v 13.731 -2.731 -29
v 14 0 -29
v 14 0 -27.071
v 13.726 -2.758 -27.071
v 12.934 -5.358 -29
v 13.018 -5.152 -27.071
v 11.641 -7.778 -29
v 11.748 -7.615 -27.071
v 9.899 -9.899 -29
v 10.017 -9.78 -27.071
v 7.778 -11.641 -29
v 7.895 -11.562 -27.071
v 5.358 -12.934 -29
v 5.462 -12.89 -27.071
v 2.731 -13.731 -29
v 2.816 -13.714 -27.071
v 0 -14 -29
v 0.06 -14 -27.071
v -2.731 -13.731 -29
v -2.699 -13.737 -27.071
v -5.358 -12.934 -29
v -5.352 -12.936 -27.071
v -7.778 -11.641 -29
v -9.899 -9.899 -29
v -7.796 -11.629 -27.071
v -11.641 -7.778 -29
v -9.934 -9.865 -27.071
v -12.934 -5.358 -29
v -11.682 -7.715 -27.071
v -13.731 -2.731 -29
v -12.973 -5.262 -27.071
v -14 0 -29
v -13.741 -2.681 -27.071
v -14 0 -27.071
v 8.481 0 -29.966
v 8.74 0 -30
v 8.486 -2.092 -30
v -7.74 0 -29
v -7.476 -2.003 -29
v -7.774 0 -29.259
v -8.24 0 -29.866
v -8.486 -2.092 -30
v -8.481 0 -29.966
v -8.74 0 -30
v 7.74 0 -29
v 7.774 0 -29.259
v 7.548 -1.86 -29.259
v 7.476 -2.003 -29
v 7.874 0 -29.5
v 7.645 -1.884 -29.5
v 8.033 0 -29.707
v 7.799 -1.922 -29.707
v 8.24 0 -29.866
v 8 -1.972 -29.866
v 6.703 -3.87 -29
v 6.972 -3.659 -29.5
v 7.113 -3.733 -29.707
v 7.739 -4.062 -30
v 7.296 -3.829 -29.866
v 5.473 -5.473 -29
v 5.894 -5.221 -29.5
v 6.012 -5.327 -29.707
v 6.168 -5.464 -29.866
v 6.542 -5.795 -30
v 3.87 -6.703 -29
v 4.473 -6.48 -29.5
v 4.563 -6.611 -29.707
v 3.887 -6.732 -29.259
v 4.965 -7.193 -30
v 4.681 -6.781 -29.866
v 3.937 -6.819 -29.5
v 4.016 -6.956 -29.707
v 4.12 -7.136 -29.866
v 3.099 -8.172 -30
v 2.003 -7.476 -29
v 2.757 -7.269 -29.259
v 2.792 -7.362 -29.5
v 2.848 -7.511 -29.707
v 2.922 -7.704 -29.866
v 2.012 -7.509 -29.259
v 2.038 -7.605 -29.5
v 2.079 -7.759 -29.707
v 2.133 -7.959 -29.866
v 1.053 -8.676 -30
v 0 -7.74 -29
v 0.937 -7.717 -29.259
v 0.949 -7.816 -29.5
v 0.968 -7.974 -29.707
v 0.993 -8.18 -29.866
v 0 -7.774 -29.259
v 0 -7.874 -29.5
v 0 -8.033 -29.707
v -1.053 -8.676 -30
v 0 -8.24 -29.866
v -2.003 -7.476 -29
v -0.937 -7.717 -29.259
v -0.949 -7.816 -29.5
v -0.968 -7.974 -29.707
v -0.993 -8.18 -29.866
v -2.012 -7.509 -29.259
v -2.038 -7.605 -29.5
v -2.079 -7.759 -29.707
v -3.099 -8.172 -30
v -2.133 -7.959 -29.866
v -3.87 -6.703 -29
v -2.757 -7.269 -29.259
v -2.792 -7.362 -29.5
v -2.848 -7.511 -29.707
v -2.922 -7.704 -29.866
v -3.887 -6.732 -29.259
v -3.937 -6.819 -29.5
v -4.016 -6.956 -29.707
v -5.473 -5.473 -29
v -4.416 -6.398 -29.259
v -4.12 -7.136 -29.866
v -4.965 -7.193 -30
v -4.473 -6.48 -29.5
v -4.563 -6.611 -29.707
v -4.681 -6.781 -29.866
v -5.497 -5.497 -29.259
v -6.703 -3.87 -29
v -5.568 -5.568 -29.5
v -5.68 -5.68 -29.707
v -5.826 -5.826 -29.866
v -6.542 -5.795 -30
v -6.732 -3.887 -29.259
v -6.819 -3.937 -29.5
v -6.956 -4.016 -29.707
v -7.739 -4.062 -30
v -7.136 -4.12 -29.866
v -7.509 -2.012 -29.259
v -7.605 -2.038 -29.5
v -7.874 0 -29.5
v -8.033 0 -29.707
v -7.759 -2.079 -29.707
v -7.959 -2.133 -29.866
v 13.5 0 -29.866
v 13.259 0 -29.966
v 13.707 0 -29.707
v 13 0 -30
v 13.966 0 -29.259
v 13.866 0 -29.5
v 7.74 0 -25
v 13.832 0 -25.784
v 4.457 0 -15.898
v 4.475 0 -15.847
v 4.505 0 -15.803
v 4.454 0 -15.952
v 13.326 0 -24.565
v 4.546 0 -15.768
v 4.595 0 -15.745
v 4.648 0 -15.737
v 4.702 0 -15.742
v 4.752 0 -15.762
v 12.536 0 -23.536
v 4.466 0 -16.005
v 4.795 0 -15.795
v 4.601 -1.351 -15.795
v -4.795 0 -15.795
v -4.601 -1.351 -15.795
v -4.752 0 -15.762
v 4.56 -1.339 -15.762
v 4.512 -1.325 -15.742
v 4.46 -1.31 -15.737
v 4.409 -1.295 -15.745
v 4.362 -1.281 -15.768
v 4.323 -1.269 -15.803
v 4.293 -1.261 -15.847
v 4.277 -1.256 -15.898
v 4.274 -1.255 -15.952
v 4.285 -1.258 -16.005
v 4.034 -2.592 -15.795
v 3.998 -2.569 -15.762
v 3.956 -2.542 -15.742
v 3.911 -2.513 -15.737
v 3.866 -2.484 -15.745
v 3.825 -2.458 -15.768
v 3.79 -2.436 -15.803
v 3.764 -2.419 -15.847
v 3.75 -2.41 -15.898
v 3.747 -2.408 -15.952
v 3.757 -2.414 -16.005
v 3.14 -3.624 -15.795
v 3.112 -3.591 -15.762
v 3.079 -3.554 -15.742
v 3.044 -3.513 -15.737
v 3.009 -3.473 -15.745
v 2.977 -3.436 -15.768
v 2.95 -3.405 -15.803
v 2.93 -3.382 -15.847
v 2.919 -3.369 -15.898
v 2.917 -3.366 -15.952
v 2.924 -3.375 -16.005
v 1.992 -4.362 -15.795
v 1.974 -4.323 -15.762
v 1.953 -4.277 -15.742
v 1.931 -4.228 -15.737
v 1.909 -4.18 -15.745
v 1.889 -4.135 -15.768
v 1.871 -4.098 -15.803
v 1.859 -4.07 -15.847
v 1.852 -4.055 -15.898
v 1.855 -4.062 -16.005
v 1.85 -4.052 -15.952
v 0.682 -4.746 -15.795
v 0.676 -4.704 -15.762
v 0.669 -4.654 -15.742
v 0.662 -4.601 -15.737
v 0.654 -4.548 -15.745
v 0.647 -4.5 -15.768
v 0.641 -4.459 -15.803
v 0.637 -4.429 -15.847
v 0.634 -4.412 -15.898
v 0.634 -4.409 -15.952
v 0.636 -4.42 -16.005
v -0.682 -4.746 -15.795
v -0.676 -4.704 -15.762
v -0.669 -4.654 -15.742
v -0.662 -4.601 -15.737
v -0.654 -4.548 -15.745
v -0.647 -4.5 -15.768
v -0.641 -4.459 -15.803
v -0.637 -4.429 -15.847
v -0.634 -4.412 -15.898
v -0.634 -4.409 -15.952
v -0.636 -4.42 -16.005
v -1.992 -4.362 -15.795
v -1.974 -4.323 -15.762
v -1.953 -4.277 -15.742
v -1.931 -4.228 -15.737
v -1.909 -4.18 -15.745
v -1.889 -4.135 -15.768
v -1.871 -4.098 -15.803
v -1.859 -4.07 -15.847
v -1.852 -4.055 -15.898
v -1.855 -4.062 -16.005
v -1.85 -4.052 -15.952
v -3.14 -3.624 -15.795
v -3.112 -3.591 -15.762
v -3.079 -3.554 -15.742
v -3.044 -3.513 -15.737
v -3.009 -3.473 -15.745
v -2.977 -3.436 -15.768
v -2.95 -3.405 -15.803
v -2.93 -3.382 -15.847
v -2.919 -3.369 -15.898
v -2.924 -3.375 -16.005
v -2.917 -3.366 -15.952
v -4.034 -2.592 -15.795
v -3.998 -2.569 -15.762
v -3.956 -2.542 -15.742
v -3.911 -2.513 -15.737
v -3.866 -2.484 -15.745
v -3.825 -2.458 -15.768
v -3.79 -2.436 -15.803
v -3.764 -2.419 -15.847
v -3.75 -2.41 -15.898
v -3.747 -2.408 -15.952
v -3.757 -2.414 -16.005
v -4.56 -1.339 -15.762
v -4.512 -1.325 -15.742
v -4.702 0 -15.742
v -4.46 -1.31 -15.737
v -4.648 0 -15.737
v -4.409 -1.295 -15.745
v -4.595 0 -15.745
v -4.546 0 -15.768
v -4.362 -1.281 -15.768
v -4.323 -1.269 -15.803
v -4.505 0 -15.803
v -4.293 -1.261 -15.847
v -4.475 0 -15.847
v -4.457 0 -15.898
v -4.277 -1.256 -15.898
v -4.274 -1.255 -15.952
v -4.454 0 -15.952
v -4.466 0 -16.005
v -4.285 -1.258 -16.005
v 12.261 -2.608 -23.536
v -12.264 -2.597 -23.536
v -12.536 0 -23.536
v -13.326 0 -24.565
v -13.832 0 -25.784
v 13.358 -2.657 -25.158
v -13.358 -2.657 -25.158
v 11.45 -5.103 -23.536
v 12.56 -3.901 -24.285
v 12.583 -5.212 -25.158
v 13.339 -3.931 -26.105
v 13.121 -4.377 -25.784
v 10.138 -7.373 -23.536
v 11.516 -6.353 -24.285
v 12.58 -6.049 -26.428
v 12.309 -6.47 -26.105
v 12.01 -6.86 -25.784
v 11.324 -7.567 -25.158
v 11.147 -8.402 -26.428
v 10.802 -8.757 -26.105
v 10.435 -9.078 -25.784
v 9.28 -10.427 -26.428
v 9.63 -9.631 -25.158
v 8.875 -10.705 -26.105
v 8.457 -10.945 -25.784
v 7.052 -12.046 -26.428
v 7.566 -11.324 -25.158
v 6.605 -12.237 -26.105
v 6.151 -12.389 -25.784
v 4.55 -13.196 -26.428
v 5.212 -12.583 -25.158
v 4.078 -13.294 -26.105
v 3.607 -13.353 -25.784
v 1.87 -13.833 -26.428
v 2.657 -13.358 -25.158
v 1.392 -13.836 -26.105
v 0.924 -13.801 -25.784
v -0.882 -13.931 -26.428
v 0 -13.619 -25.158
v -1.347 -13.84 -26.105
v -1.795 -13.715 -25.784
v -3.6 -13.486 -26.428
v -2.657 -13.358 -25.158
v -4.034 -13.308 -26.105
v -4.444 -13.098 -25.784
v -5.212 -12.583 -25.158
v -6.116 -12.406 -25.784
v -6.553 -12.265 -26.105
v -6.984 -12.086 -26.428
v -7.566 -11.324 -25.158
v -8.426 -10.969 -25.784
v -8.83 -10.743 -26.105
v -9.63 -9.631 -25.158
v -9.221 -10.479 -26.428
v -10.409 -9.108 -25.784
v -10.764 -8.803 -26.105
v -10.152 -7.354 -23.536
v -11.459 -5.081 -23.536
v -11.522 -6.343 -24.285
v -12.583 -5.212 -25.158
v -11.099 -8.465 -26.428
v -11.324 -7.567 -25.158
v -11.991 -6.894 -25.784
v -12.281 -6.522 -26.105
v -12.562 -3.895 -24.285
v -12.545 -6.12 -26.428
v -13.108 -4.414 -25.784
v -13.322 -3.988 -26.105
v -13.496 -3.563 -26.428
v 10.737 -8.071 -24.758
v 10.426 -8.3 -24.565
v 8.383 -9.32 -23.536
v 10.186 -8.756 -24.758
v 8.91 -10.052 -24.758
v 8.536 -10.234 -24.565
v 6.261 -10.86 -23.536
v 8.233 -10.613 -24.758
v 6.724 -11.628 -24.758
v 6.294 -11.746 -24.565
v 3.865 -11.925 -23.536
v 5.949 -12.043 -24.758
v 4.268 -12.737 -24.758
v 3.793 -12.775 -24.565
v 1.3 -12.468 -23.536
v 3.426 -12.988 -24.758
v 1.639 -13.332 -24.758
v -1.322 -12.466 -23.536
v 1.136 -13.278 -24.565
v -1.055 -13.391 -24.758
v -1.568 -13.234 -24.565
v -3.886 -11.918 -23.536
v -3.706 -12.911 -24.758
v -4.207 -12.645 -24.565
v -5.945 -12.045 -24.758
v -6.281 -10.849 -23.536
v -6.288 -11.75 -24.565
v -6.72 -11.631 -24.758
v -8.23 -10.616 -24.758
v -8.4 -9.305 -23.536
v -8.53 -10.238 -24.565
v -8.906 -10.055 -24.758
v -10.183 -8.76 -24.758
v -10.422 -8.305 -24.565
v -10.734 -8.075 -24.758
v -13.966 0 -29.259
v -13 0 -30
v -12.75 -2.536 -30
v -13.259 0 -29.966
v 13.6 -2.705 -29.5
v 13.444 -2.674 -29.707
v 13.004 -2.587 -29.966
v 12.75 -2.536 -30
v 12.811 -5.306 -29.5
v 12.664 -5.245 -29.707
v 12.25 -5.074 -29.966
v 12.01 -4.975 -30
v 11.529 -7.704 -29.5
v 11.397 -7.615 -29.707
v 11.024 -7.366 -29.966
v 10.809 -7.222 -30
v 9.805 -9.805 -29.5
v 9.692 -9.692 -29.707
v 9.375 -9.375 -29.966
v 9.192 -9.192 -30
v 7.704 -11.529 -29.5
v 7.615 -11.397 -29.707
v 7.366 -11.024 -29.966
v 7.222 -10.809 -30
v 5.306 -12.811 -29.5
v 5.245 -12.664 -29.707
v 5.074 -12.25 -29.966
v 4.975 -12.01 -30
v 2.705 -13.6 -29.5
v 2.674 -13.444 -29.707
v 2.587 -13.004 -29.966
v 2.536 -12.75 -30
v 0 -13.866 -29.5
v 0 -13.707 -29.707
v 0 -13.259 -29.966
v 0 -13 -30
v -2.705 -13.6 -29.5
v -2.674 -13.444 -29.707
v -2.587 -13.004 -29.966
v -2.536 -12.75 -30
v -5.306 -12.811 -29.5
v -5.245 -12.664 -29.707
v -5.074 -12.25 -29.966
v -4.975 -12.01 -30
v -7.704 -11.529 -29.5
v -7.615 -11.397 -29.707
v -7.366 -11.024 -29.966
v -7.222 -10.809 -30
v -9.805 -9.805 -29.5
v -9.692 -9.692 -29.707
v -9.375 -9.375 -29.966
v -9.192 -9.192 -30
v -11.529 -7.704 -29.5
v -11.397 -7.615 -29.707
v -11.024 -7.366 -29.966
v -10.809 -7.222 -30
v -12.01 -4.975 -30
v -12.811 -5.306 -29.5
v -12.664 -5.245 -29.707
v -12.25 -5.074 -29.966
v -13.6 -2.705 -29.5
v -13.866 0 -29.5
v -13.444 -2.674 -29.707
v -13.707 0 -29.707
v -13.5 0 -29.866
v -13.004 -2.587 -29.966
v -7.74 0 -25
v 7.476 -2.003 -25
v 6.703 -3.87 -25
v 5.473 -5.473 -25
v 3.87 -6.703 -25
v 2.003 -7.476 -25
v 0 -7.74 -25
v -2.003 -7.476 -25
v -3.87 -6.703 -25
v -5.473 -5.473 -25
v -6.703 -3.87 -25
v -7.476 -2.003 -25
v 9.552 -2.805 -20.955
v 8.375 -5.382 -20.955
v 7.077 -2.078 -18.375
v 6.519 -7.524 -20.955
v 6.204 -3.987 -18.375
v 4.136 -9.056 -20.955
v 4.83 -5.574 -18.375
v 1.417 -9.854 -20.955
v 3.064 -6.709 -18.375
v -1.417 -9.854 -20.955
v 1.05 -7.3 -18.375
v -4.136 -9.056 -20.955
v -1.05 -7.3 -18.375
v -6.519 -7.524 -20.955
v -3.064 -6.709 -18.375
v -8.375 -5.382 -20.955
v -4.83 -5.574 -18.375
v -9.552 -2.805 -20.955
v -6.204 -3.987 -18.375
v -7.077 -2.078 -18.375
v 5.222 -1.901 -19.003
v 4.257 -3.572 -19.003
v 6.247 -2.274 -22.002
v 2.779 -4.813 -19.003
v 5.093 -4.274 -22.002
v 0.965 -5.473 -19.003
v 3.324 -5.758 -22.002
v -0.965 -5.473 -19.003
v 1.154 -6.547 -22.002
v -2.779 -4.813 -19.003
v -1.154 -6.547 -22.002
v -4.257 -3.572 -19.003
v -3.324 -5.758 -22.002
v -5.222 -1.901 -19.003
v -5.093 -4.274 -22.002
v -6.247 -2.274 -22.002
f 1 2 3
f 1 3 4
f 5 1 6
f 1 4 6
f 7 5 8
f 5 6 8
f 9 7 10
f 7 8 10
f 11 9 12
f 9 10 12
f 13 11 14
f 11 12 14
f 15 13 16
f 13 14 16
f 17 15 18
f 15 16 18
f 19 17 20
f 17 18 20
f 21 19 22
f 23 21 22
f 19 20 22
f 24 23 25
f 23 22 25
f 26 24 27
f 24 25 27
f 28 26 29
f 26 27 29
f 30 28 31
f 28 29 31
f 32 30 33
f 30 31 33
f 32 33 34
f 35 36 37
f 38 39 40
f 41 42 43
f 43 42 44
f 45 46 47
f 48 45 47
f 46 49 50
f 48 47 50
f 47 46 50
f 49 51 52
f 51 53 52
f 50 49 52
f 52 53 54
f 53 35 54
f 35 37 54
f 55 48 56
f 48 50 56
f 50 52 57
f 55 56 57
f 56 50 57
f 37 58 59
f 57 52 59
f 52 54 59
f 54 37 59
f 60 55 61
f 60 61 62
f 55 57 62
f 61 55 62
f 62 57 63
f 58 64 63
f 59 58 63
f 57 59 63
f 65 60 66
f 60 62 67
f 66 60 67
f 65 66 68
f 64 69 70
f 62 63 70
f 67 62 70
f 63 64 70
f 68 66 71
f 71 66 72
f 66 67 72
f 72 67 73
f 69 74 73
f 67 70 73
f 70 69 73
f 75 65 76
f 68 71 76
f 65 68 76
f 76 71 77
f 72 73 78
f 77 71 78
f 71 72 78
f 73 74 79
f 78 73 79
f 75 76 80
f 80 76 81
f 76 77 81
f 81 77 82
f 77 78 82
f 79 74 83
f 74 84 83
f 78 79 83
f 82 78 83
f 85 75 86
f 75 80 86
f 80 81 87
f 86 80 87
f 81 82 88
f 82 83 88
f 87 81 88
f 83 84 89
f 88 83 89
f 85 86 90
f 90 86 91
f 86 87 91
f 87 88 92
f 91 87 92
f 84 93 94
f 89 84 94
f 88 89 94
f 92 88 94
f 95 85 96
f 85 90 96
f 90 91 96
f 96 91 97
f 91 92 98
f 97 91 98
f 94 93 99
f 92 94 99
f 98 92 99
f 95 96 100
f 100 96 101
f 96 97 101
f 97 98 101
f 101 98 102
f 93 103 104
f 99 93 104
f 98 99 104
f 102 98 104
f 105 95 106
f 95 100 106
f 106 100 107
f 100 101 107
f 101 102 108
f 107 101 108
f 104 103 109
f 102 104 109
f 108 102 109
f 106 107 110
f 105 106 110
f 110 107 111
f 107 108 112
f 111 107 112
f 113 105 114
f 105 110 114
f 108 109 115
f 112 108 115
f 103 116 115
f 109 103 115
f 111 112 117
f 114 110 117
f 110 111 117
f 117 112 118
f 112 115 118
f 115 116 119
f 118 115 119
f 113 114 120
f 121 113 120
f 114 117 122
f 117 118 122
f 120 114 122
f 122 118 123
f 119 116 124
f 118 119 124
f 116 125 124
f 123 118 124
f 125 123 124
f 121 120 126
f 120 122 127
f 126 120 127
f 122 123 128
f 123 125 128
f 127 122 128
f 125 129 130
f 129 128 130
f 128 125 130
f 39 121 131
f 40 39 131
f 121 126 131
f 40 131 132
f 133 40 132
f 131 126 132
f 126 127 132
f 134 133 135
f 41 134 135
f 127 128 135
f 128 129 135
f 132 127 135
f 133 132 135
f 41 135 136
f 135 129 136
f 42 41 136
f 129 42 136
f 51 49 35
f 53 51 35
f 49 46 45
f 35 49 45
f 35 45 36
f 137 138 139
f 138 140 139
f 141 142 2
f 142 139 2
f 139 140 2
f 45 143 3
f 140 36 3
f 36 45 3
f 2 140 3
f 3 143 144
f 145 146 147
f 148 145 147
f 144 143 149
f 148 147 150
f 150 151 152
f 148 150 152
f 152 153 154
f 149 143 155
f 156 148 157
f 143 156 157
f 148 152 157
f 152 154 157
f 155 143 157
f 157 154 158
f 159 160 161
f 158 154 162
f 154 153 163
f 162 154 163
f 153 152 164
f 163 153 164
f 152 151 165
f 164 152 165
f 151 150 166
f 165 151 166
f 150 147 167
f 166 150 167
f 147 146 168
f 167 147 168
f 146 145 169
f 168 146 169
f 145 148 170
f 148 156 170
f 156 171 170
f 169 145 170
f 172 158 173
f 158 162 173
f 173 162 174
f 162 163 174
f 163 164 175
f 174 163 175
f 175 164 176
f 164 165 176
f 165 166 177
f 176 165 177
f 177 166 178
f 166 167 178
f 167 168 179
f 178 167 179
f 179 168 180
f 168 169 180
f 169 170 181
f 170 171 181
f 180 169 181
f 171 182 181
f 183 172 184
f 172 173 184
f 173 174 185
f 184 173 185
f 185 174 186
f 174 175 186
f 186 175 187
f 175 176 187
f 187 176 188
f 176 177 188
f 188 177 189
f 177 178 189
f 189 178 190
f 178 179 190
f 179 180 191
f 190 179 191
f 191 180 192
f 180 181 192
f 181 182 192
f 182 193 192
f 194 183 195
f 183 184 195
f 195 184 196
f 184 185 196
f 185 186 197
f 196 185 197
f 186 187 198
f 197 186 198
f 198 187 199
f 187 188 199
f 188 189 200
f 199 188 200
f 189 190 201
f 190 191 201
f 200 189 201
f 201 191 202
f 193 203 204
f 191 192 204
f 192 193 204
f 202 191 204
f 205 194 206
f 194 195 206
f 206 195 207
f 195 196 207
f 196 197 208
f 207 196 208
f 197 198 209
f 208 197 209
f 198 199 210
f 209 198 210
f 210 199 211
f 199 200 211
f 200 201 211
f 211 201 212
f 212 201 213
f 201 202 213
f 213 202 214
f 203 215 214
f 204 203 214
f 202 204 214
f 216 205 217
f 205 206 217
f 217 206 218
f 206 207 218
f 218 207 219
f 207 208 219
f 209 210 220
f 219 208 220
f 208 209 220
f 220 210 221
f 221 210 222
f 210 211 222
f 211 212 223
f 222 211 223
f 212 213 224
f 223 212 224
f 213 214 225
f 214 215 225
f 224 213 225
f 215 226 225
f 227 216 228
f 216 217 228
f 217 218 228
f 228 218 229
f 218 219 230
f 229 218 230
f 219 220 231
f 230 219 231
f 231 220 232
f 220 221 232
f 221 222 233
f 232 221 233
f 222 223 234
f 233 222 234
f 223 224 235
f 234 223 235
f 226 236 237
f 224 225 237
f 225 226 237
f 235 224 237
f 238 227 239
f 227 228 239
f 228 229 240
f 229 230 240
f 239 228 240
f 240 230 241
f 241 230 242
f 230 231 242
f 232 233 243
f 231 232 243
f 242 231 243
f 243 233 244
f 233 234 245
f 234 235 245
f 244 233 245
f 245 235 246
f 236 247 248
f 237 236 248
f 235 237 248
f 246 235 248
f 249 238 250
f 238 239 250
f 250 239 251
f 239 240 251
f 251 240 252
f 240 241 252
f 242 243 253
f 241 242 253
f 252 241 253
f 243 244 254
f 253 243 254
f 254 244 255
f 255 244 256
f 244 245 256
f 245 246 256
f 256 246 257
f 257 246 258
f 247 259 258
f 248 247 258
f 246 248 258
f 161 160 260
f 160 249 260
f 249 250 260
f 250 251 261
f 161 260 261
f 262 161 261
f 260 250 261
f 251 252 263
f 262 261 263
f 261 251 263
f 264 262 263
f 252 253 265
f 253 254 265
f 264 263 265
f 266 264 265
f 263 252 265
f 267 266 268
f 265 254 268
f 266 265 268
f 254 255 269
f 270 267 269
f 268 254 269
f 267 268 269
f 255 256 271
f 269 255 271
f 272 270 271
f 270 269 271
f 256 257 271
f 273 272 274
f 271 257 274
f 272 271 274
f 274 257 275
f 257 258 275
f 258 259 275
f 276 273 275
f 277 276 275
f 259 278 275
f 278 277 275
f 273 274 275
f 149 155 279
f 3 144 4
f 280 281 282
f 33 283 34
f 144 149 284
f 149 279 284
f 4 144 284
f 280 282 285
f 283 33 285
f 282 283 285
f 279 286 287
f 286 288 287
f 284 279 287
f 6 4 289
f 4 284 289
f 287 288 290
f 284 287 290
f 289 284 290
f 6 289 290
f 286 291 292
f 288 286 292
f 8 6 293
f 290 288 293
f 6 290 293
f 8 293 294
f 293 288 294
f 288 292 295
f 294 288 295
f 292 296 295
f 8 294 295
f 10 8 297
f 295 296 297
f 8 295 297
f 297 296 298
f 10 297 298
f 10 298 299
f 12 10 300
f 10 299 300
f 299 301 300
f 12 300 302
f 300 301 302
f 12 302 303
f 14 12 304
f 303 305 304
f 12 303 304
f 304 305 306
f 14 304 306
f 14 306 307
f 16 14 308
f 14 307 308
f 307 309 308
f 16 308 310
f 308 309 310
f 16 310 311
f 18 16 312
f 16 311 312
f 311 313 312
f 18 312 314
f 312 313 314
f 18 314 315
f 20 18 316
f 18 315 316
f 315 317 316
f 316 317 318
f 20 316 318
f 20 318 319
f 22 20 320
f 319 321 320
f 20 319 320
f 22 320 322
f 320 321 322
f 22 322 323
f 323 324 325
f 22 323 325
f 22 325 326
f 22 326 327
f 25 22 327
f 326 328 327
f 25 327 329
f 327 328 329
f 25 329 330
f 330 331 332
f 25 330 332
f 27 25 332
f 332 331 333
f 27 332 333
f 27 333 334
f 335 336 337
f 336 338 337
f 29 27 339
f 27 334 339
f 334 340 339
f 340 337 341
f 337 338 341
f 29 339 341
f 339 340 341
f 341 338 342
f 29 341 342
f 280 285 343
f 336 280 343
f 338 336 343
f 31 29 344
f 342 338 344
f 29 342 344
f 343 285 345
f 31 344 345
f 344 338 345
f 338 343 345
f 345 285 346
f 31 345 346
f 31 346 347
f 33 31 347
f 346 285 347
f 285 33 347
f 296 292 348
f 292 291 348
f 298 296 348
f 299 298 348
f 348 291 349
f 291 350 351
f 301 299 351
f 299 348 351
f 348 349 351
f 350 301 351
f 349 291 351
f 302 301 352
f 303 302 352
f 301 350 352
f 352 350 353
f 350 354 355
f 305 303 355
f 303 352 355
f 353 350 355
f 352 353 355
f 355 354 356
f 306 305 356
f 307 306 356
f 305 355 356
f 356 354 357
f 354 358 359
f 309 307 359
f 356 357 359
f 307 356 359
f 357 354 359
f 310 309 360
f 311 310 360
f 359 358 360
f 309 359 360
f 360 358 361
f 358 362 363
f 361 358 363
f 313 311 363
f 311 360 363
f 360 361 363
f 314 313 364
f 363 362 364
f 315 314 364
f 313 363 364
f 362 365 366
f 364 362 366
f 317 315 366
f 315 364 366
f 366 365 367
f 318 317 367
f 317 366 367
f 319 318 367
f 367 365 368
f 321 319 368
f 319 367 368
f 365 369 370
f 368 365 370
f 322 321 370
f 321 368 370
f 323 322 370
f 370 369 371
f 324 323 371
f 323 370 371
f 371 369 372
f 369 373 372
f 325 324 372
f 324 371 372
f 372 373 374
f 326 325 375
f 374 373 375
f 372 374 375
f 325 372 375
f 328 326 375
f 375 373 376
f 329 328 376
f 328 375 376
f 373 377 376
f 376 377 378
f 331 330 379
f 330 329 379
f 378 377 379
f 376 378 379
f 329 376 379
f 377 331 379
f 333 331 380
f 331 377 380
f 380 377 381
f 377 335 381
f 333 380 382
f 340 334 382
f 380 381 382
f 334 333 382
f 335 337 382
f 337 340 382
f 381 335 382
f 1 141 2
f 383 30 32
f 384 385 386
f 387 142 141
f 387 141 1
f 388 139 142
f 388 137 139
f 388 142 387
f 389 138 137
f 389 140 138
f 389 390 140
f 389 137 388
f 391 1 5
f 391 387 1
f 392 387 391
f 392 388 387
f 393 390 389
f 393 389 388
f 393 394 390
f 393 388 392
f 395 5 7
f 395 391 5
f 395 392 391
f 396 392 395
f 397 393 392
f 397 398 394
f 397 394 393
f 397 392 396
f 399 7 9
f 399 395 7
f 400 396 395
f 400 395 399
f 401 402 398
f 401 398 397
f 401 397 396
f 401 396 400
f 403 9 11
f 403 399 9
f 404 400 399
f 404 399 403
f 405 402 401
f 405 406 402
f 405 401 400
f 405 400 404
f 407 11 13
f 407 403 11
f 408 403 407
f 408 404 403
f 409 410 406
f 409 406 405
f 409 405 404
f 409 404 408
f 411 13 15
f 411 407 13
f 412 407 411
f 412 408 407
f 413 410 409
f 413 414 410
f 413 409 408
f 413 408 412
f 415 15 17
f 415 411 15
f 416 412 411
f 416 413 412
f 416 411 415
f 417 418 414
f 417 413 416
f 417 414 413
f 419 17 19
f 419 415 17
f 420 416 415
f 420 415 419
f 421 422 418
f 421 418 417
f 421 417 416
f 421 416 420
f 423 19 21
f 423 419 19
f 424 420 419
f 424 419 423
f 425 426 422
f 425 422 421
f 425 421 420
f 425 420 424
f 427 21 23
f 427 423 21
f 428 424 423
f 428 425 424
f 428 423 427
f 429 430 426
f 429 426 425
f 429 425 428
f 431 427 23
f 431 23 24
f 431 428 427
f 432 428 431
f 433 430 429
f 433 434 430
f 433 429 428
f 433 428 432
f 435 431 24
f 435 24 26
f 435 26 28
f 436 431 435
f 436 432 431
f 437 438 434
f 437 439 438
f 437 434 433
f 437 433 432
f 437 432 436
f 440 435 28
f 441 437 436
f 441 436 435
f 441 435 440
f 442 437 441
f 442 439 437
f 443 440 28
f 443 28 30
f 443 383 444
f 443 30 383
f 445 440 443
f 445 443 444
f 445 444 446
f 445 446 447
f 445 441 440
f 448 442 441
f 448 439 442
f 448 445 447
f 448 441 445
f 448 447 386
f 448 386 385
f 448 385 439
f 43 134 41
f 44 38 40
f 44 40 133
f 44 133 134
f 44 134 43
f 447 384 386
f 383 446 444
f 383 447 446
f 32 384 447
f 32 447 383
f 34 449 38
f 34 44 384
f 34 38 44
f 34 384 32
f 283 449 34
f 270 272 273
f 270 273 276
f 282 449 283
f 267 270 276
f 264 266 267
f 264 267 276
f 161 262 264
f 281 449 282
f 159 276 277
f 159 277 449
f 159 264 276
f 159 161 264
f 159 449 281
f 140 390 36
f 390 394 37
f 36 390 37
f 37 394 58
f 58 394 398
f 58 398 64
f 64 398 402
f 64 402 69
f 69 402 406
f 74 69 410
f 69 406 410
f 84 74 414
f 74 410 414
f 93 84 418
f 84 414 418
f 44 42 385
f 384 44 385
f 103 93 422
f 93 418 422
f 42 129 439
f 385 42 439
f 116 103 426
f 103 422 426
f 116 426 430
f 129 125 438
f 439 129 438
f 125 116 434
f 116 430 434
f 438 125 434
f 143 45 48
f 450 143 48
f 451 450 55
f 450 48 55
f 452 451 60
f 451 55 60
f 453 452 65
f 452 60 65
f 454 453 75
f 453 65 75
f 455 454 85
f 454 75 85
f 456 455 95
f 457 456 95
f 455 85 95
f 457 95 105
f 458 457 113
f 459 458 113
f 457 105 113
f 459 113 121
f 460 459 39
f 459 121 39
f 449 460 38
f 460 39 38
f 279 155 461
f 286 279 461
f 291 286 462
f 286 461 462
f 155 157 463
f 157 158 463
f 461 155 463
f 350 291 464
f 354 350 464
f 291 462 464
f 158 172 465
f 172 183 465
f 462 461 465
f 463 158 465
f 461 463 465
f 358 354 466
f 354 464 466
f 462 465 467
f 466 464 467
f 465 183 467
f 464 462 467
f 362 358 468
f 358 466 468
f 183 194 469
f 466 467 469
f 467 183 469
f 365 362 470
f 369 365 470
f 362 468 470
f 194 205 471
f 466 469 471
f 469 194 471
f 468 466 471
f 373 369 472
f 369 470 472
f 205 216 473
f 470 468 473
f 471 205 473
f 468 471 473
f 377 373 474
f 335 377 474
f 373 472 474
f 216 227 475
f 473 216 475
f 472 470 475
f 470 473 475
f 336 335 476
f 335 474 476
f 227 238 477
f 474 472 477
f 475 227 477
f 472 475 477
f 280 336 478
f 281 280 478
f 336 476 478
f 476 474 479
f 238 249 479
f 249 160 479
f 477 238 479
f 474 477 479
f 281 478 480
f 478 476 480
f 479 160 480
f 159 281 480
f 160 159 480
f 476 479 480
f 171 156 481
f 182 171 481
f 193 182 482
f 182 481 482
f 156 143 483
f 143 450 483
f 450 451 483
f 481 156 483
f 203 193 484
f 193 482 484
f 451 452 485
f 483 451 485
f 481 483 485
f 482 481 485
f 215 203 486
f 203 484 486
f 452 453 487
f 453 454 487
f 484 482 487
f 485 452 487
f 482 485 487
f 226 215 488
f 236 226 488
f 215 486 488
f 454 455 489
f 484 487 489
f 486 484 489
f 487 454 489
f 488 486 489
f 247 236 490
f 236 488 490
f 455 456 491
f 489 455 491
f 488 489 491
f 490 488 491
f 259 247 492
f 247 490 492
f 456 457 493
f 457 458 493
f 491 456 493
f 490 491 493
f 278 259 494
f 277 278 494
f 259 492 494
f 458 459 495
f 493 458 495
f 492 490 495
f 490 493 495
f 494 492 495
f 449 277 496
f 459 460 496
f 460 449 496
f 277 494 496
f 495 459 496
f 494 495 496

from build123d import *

# Parameters (mm, degrees)
F1_ANGLE    = 180
F2_R        = 5
F3_R        = 1
F4_T2_ANGLE = 242.2675380927


# Not quite as in the source:
# - a fillet or chamfer that OpenCascade refuses, or shapes differently, is made with other operations: its cross-section is extruded or revolved along the edge and cut away or added


with BuildPart() as f1:
    # F0 (on Front) → F1 (revolve)
    with BuildSketch(Plane.XZ):
        Polygon((14, -25), (4.157225346, -15.157225346), (7.7397023427, -25), (7.7397023427, -30), (14, -30), align=None)
    revolve(axis=Axis((0, 0, 0), (0, 0, -1)), revolution_arc=F1_ANGLE)

    # F2
    f2_edges = [f1.edges().sort_by_distance(p)[0] for p in [
        (0, -14, -25),
    ]]
    fillet(f2_edges, radius=F2_R)

    # F3
    f3_edges = [f1.edges().sort_by_distance(p)[0] for p in [
        (0, -14, -30),
        (0, -7.739702, -30),
    ]]
    fillet(f3_edges, radius=F3_R)

    # F4: fillet of radius 0.2 on 1 edges, made by hand

    # F4_s1 → F4_t2 (revolve, cut)
    with BuildSketch(Plane(origin=(0, 0, 0), x_dir=(0, 0, 1), z_dir=(-0.5170379067, 0.8559625009, 0))):
        with BuildLine():
            ThreePointArc((-15.7951358602, 4.7951358602), (-15.7678789273, 4.5462545823), (-16.0049612451, 4.4657759798))
            Line((-16.0049612451, 4.4657759798), (-15.157225346, 4.157225346))
            Line((-15.157225346, 4.157225346), (-15.7951358602, 4.7951358602))
        make_face()
    revolve(axis=Axis((0, 0, -15.157225346), (0, 0, -1)), revolution_arc=F4_T2_ANGLE, mode=Mode.SUBTRACT)


solid = f1.part
